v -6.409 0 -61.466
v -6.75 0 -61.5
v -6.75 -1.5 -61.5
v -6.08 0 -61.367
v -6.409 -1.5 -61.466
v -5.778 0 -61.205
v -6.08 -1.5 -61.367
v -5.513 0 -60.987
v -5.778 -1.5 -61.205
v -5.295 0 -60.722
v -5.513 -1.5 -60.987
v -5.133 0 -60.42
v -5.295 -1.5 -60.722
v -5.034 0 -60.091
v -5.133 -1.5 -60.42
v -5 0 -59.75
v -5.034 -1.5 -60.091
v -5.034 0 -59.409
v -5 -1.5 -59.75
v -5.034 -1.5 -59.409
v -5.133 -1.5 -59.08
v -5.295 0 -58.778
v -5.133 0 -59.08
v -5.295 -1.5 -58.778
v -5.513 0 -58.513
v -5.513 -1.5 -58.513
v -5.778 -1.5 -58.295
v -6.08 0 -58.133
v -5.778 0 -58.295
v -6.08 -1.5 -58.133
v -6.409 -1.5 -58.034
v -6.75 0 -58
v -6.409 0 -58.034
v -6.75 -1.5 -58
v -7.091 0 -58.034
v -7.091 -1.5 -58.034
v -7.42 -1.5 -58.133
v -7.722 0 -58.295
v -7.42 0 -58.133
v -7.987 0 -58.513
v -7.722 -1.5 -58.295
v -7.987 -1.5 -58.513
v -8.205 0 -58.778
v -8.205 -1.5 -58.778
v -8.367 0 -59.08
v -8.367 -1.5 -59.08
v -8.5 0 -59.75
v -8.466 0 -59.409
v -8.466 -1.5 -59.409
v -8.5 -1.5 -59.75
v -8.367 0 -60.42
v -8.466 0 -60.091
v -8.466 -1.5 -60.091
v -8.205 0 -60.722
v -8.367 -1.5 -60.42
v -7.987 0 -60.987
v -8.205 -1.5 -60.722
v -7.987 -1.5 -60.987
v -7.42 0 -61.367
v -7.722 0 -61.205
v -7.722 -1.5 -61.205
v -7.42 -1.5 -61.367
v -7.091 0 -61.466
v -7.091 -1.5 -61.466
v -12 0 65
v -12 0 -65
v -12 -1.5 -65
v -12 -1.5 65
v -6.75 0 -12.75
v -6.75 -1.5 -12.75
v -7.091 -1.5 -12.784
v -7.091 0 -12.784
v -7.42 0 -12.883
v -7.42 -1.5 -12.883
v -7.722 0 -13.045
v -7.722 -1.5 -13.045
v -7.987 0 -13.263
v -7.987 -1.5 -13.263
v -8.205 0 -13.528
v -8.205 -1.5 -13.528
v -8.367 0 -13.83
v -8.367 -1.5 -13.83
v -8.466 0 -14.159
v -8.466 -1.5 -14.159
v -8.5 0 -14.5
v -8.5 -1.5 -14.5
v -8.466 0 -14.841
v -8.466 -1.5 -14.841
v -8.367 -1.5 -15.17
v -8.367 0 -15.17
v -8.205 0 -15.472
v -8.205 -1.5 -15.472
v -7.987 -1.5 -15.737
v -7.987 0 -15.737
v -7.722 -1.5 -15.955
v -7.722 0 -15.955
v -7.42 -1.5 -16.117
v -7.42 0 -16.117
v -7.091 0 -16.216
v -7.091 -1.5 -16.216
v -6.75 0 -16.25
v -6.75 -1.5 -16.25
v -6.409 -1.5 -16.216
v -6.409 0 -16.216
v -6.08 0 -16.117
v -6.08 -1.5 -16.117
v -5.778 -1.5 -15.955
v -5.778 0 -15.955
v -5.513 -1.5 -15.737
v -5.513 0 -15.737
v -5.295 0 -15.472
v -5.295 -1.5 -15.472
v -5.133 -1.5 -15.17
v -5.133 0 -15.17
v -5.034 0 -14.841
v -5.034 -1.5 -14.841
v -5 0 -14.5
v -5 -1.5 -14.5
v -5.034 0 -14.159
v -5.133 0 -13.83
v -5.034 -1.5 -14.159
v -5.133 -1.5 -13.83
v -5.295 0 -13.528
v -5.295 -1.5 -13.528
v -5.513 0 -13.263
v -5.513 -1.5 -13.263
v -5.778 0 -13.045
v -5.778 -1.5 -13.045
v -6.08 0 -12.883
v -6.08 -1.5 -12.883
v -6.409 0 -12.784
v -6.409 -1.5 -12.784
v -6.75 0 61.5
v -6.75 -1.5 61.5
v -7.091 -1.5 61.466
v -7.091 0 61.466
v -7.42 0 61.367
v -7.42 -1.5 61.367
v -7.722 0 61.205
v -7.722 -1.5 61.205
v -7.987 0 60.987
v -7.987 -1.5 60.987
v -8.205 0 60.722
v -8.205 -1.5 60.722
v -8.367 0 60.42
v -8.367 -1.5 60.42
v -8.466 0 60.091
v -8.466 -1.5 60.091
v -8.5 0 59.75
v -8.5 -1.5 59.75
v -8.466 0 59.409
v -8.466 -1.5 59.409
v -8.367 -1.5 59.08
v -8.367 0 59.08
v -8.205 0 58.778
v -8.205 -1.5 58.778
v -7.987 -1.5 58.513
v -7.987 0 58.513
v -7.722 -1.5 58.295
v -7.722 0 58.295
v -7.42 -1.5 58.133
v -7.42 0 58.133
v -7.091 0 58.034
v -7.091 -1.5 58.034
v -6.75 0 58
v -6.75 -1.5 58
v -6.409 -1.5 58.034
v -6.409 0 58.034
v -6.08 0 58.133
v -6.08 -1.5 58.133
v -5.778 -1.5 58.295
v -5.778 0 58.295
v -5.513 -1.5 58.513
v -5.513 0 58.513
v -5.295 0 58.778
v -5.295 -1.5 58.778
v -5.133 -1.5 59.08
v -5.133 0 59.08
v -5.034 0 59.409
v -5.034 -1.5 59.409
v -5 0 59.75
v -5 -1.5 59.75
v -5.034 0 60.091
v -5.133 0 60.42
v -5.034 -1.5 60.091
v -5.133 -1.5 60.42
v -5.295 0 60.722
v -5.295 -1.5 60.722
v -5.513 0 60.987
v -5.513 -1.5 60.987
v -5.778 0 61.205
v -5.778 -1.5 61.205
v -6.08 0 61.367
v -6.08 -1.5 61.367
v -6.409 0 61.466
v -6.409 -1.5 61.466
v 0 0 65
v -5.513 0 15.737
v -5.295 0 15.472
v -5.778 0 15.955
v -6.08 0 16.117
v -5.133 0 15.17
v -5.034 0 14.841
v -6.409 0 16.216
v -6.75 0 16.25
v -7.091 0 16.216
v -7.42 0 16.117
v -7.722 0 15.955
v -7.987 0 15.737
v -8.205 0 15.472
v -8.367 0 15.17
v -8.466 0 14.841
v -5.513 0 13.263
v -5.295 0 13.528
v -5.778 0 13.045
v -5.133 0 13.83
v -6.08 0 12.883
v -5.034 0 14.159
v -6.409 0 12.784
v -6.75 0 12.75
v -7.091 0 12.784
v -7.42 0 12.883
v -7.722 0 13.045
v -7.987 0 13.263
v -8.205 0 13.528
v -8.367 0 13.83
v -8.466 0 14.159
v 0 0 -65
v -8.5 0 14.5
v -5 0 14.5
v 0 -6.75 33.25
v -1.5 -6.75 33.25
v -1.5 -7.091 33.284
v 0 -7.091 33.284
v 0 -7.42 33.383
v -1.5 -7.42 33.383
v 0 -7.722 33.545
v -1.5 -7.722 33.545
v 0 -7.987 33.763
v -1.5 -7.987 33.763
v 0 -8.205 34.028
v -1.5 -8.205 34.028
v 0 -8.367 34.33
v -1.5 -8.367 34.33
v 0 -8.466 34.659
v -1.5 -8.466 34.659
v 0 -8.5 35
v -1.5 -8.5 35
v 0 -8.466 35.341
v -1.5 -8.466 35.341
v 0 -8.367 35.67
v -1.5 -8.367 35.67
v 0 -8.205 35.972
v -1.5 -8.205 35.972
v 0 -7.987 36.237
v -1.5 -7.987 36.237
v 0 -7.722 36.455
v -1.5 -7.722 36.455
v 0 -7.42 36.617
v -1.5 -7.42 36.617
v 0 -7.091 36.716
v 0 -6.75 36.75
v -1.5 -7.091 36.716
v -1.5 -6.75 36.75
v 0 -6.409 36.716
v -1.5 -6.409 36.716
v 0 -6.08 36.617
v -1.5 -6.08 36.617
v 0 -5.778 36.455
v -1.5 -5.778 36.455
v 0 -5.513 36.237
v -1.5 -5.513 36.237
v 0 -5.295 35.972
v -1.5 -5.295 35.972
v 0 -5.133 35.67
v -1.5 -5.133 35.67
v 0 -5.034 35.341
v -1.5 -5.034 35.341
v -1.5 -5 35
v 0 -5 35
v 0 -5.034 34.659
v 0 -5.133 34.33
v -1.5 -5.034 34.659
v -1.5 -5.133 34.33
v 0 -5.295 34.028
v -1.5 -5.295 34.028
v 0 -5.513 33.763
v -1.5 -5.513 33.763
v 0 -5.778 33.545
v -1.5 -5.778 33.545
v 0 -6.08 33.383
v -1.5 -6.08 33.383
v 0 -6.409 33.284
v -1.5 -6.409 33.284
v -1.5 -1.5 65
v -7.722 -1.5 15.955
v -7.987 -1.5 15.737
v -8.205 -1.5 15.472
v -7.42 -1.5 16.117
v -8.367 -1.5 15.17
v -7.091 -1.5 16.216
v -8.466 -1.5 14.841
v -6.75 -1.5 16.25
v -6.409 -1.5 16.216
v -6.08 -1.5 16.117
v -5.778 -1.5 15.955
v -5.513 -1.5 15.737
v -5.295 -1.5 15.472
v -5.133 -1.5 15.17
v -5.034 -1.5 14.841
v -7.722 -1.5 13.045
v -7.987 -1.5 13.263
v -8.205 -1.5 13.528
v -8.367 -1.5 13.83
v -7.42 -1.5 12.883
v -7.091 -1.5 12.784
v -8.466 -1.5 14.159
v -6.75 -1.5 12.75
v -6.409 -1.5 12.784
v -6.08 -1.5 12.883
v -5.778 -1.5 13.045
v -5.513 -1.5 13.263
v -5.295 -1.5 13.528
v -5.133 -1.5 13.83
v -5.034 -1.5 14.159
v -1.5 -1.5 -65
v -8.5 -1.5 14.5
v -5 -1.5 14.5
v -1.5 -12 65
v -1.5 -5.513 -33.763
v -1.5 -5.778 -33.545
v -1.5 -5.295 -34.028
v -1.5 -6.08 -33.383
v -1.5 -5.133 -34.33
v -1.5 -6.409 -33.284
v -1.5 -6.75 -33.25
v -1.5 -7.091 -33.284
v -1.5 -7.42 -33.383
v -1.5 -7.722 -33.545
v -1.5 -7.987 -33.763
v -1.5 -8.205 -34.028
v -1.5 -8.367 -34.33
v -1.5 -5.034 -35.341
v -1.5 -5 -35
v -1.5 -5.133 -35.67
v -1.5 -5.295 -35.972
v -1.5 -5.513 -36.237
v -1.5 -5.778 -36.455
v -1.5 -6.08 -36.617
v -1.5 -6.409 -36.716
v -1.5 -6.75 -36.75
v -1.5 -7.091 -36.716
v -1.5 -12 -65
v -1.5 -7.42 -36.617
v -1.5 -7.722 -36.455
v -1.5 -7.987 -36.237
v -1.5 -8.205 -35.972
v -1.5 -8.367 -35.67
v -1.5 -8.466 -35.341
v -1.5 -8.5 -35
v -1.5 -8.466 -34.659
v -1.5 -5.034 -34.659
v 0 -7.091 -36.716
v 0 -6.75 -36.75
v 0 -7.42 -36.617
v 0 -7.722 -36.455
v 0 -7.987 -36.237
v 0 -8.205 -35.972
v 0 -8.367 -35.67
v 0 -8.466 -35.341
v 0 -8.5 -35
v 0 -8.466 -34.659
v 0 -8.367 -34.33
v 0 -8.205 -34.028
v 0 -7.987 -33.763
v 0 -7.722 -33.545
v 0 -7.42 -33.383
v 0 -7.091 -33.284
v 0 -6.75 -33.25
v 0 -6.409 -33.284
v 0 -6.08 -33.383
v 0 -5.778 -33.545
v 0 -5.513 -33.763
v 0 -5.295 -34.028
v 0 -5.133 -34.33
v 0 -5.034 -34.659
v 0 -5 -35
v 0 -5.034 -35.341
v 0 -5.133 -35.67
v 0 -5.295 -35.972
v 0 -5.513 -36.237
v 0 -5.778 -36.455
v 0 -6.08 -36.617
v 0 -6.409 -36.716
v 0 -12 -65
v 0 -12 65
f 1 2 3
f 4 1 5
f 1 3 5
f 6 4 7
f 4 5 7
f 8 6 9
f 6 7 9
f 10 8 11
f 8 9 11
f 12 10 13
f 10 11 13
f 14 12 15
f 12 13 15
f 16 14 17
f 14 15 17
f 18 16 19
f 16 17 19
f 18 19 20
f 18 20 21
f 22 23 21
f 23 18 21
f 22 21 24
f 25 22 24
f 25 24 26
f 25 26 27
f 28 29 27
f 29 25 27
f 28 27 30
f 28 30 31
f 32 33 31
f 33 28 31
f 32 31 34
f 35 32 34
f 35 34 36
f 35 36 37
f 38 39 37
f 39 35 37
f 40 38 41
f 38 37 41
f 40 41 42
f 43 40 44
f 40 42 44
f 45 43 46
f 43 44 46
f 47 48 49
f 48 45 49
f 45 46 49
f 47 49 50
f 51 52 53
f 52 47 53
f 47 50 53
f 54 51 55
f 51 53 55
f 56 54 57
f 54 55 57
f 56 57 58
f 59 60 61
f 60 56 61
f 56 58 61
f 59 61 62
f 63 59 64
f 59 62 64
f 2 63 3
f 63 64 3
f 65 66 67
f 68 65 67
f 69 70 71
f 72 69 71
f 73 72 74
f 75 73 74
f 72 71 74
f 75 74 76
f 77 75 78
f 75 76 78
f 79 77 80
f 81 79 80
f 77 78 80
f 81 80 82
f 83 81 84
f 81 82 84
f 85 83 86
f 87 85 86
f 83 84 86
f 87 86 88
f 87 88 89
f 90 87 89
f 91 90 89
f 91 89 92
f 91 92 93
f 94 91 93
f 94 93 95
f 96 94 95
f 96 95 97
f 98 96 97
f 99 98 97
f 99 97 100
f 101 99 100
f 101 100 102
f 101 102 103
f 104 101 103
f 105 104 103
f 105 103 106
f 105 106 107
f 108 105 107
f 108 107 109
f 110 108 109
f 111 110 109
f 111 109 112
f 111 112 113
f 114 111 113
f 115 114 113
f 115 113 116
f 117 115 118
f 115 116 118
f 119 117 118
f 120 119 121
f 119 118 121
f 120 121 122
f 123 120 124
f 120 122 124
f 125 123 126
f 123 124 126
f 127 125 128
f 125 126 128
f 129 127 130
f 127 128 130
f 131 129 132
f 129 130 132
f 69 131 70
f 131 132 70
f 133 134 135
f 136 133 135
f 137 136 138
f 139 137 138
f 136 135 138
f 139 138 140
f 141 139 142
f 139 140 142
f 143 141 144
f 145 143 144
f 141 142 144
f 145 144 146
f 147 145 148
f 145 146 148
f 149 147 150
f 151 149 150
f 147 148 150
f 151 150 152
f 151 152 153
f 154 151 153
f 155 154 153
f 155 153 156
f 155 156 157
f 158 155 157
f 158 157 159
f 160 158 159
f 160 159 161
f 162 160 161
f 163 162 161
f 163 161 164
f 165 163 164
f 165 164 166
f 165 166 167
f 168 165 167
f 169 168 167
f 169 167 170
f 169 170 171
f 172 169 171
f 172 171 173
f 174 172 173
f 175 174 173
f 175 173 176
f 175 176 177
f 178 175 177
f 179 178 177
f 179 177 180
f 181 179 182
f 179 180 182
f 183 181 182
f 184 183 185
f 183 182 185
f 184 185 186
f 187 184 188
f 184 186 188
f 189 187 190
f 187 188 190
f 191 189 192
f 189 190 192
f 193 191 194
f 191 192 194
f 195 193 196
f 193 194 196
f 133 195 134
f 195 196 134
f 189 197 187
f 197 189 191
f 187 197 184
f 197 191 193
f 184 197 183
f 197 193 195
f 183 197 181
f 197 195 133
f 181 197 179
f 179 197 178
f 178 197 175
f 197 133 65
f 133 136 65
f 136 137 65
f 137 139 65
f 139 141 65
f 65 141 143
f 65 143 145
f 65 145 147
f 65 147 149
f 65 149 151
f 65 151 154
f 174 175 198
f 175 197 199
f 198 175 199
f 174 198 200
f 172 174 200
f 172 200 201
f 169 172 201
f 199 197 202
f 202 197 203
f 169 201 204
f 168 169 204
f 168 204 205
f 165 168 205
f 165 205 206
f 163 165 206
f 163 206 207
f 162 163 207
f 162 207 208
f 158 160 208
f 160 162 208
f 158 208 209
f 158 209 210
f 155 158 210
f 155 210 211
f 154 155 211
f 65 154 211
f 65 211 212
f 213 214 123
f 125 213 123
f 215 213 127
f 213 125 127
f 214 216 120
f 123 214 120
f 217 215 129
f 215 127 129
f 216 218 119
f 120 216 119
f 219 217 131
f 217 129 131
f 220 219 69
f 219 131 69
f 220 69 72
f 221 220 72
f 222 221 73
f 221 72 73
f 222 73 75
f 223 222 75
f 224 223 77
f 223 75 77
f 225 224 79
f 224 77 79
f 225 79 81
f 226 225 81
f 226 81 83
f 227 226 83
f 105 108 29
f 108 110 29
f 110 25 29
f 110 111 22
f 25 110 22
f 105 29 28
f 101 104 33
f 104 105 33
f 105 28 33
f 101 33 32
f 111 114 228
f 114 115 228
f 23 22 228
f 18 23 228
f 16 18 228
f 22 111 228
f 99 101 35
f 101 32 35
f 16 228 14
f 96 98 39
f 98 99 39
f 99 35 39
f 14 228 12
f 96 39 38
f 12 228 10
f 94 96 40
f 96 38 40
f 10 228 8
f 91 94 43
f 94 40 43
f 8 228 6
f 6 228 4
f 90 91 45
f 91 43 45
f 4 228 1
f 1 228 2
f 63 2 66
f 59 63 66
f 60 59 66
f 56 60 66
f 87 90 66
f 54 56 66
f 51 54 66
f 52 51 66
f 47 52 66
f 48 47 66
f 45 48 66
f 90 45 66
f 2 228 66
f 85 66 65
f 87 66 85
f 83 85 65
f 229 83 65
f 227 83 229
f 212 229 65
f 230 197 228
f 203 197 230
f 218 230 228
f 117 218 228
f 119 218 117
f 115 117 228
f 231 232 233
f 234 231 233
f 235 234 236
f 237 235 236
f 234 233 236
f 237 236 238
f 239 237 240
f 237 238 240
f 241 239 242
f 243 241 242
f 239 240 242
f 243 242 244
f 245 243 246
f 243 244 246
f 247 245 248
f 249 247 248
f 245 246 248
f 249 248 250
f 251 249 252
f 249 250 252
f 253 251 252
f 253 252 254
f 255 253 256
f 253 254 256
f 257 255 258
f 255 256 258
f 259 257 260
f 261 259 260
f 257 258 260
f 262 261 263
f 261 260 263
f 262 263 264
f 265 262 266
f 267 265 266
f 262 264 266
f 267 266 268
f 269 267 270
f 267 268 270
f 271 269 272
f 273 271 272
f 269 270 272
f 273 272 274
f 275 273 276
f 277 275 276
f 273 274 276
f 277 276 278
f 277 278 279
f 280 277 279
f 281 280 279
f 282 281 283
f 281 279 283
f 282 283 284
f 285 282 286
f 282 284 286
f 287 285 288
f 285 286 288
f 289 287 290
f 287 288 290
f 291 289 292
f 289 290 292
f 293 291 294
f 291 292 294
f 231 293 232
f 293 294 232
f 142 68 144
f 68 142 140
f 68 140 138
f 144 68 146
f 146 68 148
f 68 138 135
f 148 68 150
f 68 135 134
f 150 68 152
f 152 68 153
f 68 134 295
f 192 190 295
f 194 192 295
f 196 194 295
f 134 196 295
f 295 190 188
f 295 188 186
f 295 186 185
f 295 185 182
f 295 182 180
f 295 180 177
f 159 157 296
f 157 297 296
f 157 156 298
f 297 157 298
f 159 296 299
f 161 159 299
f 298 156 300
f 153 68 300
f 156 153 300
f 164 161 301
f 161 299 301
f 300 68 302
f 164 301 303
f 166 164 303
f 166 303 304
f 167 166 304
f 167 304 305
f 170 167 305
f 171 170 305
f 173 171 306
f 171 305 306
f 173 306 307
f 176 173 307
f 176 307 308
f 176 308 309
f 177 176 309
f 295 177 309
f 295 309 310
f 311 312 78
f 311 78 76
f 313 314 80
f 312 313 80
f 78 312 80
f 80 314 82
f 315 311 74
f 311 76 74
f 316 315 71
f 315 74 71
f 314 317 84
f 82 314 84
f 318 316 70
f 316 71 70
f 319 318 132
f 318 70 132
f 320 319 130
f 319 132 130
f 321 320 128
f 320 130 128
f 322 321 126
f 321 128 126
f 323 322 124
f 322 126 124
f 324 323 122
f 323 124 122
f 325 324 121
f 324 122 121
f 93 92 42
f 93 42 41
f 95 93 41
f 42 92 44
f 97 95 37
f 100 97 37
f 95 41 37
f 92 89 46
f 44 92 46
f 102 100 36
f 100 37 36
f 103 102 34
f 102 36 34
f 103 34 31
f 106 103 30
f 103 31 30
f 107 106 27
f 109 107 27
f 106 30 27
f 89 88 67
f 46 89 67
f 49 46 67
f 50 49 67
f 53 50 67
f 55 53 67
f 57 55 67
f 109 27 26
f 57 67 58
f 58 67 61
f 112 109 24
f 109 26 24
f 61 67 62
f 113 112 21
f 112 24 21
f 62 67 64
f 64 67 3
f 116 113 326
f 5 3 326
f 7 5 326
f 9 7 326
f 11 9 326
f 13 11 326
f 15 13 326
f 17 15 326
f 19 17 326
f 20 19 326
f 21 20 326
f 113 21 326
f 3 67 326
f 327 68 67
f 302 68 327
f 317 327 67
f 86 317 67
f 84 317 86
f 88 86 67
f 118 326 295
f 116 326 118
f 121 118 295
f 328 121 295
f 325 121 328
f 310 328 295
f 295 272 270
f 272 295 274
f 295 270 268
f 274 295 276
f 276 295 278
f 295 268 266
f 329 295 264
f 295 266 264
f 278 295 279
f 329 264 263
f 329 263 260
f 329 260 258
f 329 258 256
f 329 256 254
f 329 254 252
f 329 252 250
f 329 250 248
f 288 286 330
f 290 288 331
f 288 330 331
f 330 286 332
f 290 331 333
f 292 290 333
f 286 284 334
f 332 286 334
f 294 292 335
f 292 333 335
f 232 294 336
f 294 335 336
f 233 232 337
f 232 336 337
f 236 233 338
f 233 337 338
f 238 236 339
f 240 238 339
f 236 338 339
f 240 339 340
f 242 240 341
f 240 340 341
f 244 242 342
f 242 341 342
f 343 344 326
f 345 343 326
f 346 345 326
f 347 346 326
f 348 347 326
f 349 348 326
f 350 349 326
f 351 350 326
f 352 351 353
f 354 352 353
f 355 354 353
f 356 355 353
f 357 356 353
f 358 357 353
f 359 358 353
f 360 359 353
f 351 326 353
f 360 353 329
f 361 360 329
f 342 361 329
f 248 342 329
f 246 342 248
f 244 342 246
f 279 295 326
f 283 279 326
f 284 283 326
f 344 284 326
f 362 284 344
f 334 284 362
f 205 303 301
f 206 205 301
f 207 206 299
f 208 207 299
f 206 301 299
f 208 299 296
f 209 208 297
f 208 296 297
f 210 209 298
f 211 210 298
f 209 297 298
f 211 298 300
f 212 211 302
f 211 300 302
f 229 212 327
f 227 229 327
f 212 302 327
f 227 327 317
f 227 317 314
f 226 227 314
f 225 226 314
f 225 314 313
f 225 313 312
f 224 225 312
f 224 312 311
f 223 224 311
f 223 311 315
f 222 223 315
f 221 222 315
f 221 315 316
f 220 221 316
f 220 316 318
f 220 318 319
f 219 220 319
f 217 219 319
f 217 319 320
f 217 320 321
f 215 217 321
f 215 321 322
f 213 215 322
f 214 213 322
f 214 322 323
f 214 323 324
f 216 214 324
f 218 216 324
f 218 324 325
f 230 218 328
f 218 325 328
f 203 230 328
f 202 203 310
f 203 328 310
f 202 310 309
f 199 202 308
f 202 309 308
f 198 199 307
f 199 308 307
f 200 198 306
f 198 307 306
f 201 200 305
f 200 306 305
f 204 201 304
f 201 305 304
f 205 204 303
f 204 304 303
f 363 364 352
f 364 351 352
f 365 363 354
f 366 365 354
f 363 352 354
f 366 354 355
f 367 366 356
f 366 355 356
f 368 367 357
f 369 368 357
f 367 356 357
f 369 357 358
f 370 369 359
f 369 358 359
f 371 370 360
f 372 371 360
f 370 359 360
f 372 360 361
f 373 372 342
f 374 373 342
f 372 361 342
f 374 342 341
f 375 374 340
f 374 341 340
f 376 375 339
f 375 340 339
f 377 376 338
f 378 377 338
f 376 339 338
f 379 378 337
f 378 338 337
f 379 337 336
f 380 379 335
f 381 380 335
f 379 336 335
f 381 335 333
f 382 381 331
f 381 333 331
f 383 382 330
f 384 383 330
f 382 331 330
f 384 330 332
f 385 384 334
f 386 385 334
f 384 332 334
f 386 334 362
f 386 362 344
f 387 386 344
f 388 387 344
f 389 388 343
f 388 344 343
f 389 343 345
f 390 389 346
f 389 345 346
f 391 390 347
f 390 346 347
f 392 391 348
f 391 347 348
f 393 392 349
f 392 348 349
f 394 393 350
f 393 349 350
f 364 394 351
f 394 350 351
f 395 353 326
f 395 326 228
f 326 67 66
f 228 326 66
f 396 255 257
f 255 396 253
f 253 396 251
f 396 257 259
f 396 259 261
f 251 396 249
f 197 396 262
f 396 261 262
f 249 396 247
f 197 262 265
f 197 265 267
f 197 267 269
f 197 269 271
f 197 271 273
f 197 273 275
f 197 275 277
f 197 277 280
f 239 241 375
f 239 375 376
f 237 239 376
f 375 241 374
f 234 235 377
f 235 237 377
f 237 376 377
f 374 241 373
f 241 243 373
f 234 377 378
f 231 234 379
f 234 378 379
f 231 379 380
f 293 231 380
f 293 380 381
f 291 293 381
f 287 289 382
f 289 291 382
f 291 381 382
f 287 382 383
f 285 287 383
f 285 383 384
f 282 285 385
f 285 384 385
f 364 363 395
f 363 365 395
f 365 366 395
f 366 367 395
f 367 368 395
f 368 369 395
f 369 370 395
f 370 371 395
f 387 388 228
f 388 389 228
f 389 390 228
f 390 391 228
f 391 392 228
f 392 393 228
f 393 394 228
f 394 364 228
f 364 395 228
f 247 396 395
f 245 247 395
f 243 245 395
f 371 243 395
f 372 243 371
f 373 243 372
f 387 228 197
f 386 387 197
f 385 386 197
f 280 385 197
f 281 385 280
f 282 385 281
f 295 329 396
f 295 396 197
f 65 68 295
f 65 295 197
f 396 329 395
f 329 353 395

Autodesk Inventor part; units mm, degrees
ref_plane "YZ Plane" through (0, 0, 0) normal (1, 0, 0) x (0, 1, 0)
ref_plane "XZ Plane" through (0, 0, 0) normal (0, 1, 0) x (-1, 0, 0)
ref_plane "XY Plane" through (0, 0, 0) normal (0, 0, 1) x (1, 0, 0)
sketch "Szkic1" plane through (0, 0, 0) normal (0, 0, 1) x (1, 0, 0)
  line L0 (0, 0) -> (0, 12)
  line L1 (0, 12) -> (-1.5, 12)
  line L2 (-1.5, 12) -> (-1.5, 1.5)
  line L3 (-1.5, 1.5) -> (-12, 1.5)
  line L4 (-12, 1.5) -> (-12, 0)
  line L5 (-12, 0) -> (0, 0)
  dimension "d0" = 12
  dimension "d1" = 1.5
  dimension "d2" = 10.5
  dimension "d3" = 10.5
extrude "Wyciągnięcie proste1" add sketch "Szkic1" along normal mid plane 130
move or copy body "Przesuń bryłę1" bodies to move or copy 1 copy no rotation origin (0, 0, 0) rotation axis (0, 0, 1) rotation angle 90
sketch "Szkic2" plane through (-12, 0, 65) normal (0, 1, 0) x (1, 0, 0)
  line L0 (12, 0) -> (0, 0) projected
  line L1 (12, 0) -> (12, 130) projected
  line L2 (0, 130) -> (0, 0) construction
  line L3 (0, 65) -> (5.25, 65) construction
  line L4 (5.25, 79.5) -> (5.25, 50.5) construction
  point P0 (12, 65)
  dimension "d16" = 5.25
  dimension "d17" = 29
hole "Otwór1" at (-6.75, 0, -14.5) at (-6.75, 0, 14.5) direction (0, -1, 0) diameter 3.5 end through all
sketch "Szkic3" plane through (-12, 0, 65) normal (0, 1, 0) x (1, 0, 0)
  line L0 (0, 130) -> (0, 0) construction
  line L1 (12, 0) -> (0, 0) construction
  point P0 (12, 65)
  point P1 (5.25, 5.25)
  dimension "d19" = 5.25
  dimension "d20" = 5.25
hole "Otwór2" at (-6.75, 0, 59.75) direction (0, -1, 0) diameter 3.5 end through all
mirror "Odbij1" about plane through (0, 0, 0) normal (0, 0, 1) of "Otwór2"
sketch "Szkic5" plane through (0, -12, 65) normal (1, 0, 0) x (0, 0, -1)
  line L0 (130, 0) -> (0, 0) construction
  line L1 (65, 0) -> (65, 5.25) construction
  line L2 (30, 5.25) -> (100, 5.25) construction
  point P0 (65, 12)
  dimension "d37" = 5.25
  dimension "d38" = 70
hole "Otwór4" at (0, -6.75, 35) at (0, -6.75, -35) direction (-1, 0, 0) diameter 3.5 end through all
properties part number "bepf_platforma_rama_bok_krotki" material "Aluminium 6061"
